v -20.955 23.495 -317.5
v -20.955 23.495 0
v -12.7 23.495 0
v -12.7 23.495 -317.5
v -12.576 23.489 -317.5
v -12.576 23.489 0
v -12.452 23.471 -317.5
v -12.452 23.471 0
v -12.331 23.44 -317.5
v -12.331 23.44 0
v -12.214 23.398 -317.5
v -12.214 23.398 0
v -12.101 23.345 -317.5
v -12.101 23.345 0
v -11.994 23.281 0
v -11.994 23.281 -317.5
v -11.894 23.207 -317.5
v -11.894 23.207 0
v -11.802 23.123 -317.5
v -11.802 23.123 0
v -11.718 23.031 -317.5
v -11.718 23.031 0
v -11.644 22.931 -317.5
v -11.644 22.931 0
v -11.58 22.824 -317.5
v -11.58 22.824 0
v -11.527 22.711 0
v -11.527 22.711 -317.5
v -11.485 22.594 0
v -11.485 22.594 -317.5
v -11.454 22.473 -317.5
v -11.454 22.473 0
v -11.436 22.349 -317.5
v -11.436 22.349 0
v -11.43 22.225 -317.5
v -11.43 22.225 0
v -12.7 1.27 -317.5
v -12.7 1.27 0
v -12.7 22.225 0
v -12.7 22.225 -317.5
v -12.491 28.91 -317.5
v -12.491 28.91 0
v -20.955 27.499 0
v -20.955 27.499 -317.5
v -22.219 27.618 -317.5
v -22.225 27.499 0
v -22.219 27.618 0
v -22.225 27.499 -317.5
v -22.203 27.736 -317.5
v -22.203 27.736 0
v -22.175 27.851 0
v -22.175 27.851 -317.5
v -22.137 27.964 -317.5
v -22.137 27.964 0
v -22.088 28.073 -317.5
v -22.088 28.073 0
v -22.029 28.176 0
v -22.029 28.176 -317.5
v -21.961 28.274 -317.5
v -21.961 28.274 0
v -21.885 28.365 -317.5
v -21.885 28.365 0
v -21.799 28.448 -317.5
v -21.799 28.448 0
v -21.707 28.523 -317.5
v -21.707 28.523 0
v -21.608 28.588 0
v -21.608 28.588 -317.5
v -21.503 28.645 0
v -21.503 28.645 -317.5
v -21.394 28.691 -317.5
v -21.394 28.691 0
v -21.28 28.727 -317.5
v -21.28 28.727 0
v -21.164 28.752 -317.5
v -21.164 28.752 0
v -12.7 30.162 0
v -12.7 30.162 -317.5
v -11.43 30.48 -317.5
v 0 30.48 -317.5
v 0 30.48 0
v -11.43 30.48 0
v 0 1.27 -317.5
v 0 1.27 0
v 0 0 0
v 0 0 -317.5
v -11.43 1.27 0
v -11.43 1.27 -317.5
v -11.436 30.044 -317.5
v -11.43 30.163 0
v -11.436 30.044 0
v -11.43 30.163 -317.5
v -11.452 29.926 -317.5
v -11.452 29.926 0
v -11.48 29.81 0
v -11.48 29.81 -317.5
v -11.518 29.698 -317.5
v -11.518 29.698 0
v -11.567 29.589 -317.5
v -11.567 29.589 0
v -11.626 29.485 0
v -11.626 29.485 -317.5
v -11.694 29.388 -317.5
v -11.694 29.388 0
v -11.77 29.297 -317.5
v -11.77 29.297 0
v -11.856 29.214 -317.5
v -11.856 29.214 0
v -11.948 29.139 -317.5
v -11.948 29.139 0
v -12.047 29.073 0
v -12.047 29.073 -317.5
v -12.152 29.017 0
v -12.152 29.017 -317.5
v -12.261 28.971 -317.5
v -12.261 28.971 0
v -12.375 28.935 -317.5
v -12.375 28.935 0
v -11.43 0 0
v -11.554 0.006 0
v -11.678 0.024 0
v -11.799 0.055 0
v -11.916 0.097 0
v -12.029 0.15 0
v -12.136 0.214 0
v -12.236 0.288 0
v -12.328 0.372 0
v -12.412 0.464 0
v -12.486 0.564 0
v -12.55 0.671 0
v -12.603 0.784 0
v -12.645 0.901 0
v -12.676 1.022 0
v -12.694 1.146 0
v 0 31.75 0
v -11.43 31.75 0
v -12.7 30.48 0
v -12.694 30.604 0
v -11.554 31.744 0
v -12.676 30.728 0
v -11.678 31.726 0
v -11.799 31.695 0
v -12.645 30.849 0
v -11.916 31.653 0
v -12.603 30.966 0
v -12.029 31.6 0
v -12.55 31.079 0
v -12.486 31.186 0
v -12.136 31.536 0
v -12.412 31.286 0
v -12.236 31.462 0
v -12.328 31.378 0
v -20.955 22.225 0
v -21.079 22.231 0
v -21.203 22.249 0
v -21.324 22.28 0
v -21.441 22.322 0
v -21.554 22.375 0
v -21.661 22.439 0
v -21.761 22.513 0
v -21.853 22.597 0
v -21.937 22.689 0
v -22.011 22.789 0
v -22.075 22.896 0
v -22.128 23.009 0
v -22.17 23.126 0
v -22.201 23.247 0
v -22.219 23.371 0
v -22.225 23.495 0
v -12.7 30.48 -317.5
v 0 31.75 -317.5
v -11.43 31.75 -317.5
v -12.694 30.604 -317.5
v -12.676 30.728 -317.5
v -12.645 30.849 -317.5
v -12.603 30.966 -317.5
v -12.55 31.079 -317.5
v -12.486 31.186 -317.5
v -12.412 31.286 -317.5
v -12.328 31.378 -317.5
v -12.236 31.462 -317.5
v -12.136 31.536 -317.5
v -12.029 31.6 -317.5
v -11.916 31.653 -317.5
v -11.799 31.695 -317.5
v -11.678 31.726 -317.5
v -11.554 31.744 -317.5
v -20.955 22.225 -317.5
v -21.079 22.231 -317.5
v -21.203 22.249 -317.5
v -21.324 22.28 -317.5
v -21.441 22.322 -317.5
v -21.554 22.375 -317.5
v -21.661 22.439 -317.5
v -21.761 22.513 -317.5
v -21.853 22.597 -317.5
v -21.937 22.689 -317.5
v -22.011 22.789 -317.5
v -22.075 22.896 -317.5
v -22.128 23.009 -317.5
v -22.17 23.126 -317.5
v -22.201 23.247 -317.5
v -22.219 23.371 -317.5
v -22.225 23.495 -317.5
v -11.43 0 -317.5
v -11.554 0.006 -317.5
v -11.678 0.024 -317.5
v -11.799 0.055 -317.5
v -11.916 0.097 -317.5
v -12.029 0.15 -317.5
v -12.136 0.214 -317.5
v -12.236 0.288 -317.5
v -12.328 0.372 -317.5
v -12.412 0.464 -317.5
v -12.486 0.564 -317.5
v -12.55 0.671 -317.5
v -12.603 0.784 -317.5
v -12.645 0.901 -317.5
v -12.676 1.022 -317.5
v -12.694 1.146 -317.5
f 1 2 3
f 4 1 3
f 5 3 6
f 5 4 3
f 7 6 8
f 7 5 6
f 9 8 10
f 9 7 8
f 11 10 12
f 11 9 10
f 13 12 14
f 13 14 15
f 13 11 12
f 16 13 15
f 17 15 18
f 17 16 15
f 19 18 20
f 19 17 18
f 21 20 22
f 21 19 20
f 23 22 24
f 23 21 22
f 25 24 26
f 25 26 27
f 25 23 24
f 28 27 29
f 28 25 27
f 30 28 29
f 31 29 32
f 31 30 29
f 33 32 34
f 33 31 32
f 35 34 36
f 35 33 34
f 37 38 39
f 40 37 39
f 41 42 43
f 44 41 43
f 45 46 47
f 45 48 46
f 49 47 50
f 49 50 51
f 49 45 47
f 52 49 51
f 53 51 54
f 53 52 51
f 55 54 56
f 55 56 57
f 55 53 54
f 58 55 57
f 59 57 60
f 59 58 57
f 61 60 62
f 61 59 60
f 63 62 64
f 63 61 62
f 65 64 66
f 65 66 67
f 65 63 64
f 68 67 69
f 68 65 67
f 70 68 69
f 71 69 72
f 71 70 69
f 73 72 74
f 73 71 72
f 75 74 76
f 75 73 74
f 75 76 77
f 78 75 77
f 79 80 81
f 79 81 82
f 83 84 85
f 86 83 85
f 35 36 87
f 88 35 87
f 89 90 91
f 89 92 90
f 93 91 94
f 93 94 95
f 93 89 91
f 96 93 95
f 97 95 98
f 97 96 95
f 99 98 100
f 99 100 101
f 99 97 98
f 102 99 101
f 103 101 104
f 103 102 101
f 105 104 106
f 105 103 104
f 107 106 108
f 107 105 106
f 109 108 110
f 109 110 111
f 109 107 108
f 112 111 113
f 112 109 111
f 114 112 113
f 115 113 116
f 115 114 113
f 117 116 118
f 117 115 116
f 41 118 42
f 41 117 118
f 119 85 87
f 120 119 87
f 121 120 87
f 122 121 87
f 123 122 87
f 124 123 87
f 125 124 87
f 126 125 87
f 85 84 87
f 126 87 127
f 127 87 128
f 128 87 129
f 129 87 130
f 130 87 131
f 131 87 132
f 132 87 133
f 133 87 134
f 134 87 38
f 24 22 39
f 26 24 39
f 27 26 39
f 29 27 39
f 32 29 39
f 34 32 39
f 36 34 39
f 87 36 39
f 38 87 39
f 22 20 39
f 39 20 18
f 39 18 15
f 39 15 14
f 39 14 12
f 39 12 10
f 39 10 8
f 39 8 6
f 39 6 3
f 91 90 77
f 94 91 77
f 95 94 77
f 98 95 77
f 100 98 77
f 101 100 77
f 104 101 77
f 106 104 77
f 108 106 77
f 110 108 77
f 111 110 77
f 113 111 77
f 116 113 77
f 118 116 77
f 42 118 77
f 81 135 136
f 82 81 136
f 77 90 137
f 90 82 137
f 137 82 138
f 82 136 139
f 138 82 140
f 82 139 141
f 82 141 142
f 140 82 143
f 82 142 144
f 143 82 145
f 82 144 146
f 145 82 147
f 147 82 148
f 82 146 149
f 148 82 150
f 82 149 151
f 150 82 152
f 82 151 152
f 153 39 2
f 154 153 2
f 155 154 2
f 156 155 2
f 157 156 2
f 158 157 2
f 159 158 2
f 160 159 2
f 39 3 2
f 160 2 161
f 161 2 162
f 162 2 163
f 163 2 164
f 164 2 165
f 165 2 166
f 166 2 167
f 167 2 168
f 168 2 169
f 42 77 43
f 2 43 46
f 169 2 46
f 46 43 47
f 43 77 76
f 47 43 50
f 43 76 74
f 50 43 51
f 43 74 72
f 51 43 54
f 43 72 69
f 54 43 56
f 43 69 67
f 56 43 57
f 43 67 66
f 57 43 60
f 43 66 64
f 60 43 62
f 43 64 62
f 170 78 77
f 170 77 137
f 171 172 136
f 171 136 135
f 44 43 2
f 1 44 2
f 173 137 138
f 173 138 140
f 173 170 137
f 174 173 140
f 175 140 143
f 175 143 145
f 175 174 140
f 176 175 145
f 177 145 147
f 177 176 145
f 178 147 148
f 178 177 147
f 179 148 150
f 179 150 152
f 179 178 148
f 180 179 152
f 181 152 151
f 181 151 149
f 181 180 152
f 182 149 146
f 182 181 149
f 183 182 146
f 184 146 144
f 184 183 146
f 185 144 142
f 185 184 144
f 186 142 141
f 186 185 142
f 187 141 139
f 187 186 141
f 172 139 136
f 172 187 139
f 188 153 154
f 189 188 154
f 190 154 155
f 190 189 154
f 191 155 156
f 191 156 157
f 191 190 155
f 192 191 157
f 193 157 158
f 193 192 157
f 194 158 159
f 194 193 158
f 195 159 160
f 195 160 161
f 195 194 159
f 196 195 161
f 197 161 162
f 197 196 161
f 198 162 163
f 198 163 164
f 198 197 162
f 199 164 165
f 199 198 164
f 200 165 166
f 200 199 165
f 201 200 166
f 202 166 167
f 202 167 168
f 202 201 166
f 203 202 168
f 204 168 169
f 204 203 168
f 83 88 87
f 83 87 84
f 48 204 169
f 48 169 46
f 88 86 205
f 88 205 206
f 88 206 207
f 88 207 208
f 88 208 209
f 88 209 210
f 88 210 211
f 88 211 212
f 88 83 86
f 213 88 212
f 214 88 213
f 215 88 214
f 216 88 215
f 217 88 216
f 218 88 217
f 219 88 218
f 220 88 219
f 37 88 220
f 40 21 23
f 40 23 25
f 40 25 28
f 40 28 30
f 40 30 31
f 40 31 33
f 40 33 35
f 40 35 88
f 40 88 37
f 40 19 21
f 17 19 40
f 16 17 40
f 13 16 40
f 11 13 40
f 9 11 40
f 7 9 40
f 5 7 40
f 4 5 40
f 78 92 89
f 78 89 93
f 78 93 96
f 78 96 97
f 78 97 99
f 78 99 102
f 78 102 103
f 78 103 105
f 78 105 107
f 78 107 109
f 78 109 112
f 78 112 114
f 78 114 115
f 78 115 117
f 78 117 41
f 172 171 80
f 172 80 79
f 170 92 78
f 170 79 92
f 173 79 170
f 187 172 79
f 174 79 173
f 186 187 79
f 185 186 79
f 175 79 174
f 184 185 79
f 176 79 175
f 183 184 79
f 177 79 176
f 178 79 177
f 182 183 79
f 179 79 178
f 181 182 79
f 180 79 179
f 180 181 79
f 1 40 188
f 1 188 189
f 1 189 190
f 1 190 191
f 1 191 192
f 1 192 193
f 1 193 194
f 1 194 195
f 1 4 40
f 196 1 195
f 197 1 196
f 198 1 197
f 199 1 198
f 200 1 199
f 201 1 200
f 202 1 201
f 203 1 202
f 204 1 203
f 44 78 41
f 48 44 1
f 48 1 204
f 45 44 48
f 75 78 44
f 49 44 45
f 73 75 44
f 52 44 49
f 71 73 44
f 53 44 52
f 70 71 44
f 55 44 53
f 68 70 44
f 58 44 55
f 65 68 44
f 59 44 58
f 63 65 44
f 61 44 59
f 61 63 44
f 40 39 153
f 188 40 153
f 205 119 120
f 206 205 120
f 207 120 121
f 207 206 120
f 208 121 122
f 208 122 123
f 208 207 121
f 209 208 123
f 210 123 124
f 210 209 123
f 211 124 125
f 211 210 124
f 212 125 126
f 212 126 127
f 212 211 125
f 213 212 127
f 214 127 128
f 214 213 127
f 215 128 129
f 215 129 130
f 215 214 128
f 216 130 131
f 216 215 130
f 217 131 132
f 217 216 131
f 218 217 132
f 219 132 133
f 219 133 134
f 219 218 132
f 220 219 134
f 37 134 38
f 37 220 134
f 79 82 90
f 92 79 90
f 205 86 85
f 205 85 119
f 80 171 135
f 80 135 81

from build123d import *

# Parameters (mm, degrees)
EXTRUDE_THIN1_DEPTH = 317.5
FILLET1_R           = 1.27


with BuildPart() as part:
    # Sketch1 → Extrude-Thin1 (new body)
    with BuildSketch(Plane.XY):
        Polygon((0, 0), (-12.7, 0), (-12.7, 22.225), (-22.225, 22.225), (-22.225, 28.575), (-12.7, 30.1625), (-12.7, 31.75), (0, 31.75), (0, 30.48), (-11.43, 30.48), (-11.43, 29.086648598), (-20.955, 27.499148598), (-20.955, 23.495), (-11.43, 23.495), (-11.43, 1.27), (0, 1.27), align=None)
    extrude(amount=-EXTRUDE_THIN1_DEPTH)

    # Fillet1
    fillet1_edges = [part.edges().sort_by_distance(p)[0] for p in [
        (-11.43, 29.086648598, -158.75),
        (-11.43, 23.495, -158.75),
        (-12.7, 0, -158.75),
        (-22.225, 22.225, -158.75),
        (-22.225, 28.575, -158.75),
        (-12.7, 31.75, -158.75),
    ]]
    fillet(fillet1_edges, radius=FILLET1_R)


solid = part.part
